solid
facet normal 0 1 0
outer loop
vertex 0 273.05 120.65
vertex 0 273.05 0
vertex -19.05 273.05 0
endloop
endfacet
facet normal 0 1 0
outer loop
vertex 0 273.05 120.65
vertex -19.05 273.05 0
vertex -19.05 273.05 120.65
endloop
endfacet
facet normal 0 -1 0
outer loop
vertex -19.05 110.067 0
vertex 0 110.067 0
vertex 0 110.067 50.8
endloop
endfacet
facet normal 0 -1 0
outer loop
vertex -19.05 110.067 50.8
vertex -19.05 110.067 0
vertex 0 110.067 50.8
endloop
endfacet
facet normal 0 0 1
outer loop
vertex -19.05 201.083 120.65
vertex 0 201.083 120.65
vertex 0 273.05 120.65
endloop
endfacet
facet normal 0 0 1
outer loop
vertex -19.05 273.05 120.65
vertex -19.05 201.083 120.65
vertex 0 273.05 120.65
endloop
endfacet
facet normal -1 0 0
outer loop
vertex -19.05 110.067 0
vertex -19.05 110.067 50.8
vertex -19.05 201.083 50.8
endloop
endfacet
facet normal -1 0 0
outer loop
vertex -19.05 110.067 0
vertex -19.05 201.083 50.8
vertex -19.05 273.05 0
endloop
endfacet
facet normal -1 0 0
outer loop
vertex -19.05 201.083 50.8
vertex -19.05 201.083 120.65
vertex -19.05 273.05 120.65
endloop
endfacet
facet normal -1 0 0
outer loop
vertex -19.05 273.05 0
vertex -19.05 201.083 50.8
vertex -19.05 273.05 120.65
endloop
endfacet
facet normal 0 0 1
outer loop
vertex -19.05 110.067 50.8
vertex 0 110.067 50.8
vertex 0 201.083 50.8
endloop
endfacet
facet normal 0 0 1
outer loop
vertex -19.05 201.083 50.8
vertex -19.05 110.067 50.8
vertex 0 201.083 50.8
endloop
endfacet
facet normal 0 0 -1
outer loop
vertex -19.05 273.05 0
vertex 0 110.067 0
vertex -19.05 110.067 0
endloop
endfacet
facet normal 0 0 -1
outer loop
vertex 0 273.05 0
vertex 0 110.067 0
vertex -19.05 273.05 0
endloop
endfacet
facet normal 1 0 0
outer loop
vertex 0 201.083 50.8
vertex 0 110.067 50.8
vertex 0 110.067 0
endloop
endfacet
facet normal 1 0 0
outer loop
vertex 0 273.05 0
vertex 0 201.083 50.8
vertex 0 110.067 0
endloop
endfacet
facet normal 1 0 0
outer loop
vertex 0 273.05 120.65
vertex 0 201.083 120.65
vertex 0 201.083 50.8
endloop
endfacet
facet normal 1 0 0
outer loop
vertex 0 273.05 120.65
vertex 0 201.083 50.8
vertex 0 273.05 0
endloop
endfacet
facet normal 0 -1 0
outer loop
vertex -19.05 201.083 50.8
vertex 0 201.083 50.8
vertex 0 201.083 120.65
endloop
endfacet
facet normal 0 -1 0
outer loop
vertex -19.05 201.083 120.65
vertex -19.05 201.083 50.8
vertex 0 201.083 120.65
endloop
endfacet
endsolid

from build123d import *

# Parameters (mm, degrees)
F0_W     = 273.05
F0_H     = 228.6
F1_DEPTH = 19.05
F3_DEPTH = 19.05
F5_DEPTH = 19.05


with BuildPart() as f1:
    # F0 (on Right) → F1 (new body)
    with BuildSketch(Plane.YZ):
        with Locations((136.525, 114.3)):
            Rectangle(F0_W, F0_H)
    extrude(amount=-F1_DEPTH)

    # F2 (on face) → F3 (cut, through all)
    with BuildSketch(Plane.YZ):
        Polygon((182.0333333333, 139.7), (273.05, 139.7), (273.05, 228.6), (0, 228.6), (0, 0), (91.0166666667, 0), (91.0166666667, 69.85), (182.0333333333, 69.85), align=None)
    extrude(amount=-F3_DEPTH, mode=Mode.SUBTRACT)

    # F4 (on face) → F5 (cut, through all)
    with BuildSketch(Plane.YZ):
        Polygon((110.0666666667, 0), (110.0666666667, 50.8), (201.0833333333, 50.8), (201.0833333333, 120.65), (273.05, 120.65), (273.05, 139.7), (182.0333333333, 139.7), (182.0333333333, 69.85), (91.0166666667, 69.85), (91.0166666667, 0), align=None)
    extrude(amount=-F5_DEPTH, mode=Mode.SUBTRACT)


solid = f1.part
